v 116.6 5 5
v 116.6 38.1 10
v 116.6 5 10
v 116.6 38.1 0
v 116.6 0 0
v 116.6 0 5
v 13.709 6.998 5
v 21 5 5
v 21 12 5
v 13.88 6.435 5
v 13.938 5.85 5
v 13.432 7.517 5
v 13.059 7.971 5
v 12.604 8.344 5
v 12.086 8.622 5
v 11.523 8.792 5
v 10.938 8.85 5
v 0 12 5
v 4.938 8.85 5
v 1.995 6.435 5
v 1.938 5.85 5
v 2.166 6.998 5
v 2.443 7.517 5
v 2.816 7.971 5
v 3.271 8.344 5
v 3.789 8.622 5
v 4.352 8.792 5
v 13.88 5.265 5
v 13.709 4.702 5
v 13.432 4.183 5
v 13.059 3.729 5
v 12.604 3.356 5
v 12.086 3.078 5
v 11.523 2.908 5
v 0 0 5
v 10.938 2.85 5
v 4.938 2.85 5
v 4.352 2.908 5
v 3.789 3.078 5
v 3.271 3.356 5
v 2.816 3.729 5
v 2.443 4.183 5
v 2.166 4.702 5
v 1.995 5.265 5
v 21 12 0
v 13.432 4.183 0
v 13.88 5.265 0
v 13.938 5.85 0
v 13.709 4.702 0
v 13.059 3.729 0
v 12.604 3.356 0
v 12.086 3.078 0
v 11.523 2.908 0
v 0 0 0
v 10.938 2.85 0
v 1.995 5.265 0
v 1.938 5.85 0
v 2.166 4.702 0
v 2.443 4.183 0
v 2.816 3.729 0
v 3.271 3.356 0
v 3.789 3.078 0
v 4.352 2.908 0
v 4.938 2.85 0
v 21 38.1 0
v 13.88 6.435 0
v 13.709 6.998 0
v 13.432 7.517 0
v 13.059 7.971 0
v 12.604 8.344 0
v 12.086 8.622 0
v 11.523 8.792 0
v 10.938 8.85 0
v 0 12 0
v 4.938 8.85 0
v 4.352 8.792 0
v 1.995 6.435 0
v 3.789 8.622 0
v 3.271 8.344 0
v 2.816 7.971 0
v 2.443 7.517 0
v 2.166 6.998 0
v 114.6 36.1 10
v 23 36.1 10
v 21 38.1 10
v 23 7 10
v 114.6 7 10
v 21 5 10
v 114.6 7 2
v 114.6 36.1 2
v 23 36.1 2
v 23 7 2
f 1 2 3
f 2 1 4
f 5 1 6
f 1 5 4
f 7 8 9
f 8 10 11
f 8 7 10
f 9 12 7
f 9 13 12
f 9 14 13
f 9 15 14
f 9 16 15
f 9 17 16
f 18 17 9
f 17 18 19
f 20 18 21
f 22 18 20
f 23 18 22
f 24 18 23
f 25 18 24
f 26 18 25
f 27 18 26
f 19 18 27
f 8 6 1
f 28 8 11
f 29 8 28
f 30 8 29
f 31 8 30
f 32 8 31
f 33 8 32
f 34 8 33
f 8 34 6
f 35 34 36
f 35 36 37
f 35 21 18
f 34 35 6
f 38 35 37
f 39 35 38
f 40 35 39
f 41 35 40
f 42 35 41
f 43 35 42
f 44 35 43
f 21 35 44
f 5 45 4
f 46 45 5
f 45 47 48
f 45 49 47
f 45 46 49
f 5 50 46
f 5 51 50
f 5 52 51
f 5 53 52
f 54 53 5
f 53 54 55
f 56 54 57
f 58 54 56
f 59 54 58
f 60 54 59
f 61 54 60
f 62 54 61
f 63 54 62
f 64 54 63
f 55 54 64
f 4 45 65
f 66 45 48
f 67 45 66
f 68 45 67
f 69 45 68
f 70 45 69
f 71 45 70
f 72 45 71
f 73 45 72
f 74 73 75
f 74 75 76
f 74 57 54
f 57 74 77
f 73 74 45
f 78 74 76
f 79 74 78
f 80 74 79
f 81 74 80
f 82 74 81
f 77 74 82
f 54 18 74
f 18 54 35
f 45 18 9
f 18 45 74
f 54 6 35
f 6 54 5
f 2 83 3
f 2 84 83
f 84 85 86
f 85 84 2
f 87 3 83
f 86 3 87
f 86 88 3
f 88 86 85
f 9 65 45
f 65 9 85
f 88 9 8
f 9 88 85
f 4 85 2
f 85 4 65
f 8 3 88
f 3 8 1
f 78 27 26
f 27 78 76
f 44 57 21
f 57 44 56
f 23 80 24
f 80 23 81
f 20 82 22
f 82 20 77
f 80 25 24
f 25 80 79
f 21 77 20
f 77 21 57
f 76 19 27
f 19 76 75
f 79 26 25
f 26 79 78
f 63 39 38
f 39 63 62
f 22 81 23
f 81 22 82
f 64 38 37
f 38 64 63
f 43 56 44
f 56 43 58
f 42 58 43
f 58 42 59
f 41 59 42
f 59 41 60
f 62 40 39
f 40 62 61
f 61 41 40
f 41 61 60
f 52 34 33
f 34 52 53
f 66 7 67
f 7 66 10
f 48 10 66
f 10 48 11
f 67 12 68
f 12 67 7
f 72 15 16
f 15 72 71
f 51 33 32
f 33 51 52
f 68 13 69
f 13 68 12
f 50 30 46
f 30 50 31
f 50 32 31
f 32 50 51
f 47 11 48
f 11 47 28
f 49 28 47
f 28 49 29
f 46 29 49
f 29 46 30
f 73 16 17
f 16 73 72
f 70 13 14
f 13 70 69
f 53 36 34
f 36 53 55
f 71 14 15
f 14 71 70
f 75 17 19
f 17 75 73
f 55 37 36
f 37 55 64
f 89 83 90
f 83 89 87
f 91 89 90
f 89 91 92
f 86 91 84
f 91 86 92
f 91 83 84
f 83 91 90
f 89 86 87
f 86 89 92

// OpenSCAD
module slot() {
    screw_hole_diameter = 6;
    x = (254 / 2) - 16 - 15 - 0.4;
    y = 43.5 - 10 - 0.4;
    z = 10;
    ox = 16 + 5;
    oy = 5;

    difference() {
        union() {
            cube([x + ox, 12, 5]);
            translate([ox, oy, 0])  cube([x, y, z]);
        }

        translate([15.875/2, -0.5, 0]) {
            for (j=[-screw_hole_diameter/2:screw_hole_diameter:screw_hole_diameter/2]) {
                translate([j,6.35,-0.001]) cylinder(d = screw_hole_diameter, h = 5 + 0.002, center = false, $fn = 32);                
            }
            translate([-screw_hole_diameter / 2,6.35 - screw_hole_diameter / 2,-0.001]) cube([screw_hole_diameter, screw_hole_diameter, 5 + 0.002], center = false);
        }

        translate([ox + 2, oy + 2, 2])  cube([x - 4, y - 4, z]);
    }
}

module nut() {
    difference() {
        union() {
            cube([16, 43.5, 3]);
            cube([16, 43.5 / 3 - 3, 10]);
        }
        translate([15.875 / 2, -0.5, 0]) {
            for (j = [-6 / 2, 6 / 2]) {
                translate([j, 6.35 + 15.875, -0.001]) cylinder(d = 6, h = 5 + 0.002, $fn = 32);
                translate([j, 6.35 + 15.875 * 2, -0.001]) cylinder(d = 6, h = 5 + 0.002, $fn = 32);
            }
            translate([0, 6.35, -0.001]) {
                cylinder(d = 4.5, h = 10 + 0.002, $fn = 200);
                translate([0, 0, 5]) cylinder(d = 8, h = 10, $fn = 6);
            }
            for (j = [15.875, 15.875 * 2]) {
                translate([-6 / 2, 6.35 + j - 6 / 2, -0.001]) 
                    cube([6, 6, 5 + 0.002], center = false);
            }
        }
    }
}

module knob() {
    difference() {
        union() {
            cylinder(d = 16, h = 16, $fn = 200);
            cylinder(d = 32, h = 6, $fn = 200);
            for (i = [30:30:360]) {
                rotate([0, 0, i]) translate([0, 16, 0]) cylinder(d = 6, h = 6, $fn = 200);
            }
        }
        translate([0, 0, -0.001]) cylinder(d = 4.8, h = 16.002, $fn = 200);
        translate([0, 0, -0.001]) cylinder(d = 8, h = 10, $fn = 6);
    }
}



slot();
//nut();
//translate([0,-30,0])knob();
